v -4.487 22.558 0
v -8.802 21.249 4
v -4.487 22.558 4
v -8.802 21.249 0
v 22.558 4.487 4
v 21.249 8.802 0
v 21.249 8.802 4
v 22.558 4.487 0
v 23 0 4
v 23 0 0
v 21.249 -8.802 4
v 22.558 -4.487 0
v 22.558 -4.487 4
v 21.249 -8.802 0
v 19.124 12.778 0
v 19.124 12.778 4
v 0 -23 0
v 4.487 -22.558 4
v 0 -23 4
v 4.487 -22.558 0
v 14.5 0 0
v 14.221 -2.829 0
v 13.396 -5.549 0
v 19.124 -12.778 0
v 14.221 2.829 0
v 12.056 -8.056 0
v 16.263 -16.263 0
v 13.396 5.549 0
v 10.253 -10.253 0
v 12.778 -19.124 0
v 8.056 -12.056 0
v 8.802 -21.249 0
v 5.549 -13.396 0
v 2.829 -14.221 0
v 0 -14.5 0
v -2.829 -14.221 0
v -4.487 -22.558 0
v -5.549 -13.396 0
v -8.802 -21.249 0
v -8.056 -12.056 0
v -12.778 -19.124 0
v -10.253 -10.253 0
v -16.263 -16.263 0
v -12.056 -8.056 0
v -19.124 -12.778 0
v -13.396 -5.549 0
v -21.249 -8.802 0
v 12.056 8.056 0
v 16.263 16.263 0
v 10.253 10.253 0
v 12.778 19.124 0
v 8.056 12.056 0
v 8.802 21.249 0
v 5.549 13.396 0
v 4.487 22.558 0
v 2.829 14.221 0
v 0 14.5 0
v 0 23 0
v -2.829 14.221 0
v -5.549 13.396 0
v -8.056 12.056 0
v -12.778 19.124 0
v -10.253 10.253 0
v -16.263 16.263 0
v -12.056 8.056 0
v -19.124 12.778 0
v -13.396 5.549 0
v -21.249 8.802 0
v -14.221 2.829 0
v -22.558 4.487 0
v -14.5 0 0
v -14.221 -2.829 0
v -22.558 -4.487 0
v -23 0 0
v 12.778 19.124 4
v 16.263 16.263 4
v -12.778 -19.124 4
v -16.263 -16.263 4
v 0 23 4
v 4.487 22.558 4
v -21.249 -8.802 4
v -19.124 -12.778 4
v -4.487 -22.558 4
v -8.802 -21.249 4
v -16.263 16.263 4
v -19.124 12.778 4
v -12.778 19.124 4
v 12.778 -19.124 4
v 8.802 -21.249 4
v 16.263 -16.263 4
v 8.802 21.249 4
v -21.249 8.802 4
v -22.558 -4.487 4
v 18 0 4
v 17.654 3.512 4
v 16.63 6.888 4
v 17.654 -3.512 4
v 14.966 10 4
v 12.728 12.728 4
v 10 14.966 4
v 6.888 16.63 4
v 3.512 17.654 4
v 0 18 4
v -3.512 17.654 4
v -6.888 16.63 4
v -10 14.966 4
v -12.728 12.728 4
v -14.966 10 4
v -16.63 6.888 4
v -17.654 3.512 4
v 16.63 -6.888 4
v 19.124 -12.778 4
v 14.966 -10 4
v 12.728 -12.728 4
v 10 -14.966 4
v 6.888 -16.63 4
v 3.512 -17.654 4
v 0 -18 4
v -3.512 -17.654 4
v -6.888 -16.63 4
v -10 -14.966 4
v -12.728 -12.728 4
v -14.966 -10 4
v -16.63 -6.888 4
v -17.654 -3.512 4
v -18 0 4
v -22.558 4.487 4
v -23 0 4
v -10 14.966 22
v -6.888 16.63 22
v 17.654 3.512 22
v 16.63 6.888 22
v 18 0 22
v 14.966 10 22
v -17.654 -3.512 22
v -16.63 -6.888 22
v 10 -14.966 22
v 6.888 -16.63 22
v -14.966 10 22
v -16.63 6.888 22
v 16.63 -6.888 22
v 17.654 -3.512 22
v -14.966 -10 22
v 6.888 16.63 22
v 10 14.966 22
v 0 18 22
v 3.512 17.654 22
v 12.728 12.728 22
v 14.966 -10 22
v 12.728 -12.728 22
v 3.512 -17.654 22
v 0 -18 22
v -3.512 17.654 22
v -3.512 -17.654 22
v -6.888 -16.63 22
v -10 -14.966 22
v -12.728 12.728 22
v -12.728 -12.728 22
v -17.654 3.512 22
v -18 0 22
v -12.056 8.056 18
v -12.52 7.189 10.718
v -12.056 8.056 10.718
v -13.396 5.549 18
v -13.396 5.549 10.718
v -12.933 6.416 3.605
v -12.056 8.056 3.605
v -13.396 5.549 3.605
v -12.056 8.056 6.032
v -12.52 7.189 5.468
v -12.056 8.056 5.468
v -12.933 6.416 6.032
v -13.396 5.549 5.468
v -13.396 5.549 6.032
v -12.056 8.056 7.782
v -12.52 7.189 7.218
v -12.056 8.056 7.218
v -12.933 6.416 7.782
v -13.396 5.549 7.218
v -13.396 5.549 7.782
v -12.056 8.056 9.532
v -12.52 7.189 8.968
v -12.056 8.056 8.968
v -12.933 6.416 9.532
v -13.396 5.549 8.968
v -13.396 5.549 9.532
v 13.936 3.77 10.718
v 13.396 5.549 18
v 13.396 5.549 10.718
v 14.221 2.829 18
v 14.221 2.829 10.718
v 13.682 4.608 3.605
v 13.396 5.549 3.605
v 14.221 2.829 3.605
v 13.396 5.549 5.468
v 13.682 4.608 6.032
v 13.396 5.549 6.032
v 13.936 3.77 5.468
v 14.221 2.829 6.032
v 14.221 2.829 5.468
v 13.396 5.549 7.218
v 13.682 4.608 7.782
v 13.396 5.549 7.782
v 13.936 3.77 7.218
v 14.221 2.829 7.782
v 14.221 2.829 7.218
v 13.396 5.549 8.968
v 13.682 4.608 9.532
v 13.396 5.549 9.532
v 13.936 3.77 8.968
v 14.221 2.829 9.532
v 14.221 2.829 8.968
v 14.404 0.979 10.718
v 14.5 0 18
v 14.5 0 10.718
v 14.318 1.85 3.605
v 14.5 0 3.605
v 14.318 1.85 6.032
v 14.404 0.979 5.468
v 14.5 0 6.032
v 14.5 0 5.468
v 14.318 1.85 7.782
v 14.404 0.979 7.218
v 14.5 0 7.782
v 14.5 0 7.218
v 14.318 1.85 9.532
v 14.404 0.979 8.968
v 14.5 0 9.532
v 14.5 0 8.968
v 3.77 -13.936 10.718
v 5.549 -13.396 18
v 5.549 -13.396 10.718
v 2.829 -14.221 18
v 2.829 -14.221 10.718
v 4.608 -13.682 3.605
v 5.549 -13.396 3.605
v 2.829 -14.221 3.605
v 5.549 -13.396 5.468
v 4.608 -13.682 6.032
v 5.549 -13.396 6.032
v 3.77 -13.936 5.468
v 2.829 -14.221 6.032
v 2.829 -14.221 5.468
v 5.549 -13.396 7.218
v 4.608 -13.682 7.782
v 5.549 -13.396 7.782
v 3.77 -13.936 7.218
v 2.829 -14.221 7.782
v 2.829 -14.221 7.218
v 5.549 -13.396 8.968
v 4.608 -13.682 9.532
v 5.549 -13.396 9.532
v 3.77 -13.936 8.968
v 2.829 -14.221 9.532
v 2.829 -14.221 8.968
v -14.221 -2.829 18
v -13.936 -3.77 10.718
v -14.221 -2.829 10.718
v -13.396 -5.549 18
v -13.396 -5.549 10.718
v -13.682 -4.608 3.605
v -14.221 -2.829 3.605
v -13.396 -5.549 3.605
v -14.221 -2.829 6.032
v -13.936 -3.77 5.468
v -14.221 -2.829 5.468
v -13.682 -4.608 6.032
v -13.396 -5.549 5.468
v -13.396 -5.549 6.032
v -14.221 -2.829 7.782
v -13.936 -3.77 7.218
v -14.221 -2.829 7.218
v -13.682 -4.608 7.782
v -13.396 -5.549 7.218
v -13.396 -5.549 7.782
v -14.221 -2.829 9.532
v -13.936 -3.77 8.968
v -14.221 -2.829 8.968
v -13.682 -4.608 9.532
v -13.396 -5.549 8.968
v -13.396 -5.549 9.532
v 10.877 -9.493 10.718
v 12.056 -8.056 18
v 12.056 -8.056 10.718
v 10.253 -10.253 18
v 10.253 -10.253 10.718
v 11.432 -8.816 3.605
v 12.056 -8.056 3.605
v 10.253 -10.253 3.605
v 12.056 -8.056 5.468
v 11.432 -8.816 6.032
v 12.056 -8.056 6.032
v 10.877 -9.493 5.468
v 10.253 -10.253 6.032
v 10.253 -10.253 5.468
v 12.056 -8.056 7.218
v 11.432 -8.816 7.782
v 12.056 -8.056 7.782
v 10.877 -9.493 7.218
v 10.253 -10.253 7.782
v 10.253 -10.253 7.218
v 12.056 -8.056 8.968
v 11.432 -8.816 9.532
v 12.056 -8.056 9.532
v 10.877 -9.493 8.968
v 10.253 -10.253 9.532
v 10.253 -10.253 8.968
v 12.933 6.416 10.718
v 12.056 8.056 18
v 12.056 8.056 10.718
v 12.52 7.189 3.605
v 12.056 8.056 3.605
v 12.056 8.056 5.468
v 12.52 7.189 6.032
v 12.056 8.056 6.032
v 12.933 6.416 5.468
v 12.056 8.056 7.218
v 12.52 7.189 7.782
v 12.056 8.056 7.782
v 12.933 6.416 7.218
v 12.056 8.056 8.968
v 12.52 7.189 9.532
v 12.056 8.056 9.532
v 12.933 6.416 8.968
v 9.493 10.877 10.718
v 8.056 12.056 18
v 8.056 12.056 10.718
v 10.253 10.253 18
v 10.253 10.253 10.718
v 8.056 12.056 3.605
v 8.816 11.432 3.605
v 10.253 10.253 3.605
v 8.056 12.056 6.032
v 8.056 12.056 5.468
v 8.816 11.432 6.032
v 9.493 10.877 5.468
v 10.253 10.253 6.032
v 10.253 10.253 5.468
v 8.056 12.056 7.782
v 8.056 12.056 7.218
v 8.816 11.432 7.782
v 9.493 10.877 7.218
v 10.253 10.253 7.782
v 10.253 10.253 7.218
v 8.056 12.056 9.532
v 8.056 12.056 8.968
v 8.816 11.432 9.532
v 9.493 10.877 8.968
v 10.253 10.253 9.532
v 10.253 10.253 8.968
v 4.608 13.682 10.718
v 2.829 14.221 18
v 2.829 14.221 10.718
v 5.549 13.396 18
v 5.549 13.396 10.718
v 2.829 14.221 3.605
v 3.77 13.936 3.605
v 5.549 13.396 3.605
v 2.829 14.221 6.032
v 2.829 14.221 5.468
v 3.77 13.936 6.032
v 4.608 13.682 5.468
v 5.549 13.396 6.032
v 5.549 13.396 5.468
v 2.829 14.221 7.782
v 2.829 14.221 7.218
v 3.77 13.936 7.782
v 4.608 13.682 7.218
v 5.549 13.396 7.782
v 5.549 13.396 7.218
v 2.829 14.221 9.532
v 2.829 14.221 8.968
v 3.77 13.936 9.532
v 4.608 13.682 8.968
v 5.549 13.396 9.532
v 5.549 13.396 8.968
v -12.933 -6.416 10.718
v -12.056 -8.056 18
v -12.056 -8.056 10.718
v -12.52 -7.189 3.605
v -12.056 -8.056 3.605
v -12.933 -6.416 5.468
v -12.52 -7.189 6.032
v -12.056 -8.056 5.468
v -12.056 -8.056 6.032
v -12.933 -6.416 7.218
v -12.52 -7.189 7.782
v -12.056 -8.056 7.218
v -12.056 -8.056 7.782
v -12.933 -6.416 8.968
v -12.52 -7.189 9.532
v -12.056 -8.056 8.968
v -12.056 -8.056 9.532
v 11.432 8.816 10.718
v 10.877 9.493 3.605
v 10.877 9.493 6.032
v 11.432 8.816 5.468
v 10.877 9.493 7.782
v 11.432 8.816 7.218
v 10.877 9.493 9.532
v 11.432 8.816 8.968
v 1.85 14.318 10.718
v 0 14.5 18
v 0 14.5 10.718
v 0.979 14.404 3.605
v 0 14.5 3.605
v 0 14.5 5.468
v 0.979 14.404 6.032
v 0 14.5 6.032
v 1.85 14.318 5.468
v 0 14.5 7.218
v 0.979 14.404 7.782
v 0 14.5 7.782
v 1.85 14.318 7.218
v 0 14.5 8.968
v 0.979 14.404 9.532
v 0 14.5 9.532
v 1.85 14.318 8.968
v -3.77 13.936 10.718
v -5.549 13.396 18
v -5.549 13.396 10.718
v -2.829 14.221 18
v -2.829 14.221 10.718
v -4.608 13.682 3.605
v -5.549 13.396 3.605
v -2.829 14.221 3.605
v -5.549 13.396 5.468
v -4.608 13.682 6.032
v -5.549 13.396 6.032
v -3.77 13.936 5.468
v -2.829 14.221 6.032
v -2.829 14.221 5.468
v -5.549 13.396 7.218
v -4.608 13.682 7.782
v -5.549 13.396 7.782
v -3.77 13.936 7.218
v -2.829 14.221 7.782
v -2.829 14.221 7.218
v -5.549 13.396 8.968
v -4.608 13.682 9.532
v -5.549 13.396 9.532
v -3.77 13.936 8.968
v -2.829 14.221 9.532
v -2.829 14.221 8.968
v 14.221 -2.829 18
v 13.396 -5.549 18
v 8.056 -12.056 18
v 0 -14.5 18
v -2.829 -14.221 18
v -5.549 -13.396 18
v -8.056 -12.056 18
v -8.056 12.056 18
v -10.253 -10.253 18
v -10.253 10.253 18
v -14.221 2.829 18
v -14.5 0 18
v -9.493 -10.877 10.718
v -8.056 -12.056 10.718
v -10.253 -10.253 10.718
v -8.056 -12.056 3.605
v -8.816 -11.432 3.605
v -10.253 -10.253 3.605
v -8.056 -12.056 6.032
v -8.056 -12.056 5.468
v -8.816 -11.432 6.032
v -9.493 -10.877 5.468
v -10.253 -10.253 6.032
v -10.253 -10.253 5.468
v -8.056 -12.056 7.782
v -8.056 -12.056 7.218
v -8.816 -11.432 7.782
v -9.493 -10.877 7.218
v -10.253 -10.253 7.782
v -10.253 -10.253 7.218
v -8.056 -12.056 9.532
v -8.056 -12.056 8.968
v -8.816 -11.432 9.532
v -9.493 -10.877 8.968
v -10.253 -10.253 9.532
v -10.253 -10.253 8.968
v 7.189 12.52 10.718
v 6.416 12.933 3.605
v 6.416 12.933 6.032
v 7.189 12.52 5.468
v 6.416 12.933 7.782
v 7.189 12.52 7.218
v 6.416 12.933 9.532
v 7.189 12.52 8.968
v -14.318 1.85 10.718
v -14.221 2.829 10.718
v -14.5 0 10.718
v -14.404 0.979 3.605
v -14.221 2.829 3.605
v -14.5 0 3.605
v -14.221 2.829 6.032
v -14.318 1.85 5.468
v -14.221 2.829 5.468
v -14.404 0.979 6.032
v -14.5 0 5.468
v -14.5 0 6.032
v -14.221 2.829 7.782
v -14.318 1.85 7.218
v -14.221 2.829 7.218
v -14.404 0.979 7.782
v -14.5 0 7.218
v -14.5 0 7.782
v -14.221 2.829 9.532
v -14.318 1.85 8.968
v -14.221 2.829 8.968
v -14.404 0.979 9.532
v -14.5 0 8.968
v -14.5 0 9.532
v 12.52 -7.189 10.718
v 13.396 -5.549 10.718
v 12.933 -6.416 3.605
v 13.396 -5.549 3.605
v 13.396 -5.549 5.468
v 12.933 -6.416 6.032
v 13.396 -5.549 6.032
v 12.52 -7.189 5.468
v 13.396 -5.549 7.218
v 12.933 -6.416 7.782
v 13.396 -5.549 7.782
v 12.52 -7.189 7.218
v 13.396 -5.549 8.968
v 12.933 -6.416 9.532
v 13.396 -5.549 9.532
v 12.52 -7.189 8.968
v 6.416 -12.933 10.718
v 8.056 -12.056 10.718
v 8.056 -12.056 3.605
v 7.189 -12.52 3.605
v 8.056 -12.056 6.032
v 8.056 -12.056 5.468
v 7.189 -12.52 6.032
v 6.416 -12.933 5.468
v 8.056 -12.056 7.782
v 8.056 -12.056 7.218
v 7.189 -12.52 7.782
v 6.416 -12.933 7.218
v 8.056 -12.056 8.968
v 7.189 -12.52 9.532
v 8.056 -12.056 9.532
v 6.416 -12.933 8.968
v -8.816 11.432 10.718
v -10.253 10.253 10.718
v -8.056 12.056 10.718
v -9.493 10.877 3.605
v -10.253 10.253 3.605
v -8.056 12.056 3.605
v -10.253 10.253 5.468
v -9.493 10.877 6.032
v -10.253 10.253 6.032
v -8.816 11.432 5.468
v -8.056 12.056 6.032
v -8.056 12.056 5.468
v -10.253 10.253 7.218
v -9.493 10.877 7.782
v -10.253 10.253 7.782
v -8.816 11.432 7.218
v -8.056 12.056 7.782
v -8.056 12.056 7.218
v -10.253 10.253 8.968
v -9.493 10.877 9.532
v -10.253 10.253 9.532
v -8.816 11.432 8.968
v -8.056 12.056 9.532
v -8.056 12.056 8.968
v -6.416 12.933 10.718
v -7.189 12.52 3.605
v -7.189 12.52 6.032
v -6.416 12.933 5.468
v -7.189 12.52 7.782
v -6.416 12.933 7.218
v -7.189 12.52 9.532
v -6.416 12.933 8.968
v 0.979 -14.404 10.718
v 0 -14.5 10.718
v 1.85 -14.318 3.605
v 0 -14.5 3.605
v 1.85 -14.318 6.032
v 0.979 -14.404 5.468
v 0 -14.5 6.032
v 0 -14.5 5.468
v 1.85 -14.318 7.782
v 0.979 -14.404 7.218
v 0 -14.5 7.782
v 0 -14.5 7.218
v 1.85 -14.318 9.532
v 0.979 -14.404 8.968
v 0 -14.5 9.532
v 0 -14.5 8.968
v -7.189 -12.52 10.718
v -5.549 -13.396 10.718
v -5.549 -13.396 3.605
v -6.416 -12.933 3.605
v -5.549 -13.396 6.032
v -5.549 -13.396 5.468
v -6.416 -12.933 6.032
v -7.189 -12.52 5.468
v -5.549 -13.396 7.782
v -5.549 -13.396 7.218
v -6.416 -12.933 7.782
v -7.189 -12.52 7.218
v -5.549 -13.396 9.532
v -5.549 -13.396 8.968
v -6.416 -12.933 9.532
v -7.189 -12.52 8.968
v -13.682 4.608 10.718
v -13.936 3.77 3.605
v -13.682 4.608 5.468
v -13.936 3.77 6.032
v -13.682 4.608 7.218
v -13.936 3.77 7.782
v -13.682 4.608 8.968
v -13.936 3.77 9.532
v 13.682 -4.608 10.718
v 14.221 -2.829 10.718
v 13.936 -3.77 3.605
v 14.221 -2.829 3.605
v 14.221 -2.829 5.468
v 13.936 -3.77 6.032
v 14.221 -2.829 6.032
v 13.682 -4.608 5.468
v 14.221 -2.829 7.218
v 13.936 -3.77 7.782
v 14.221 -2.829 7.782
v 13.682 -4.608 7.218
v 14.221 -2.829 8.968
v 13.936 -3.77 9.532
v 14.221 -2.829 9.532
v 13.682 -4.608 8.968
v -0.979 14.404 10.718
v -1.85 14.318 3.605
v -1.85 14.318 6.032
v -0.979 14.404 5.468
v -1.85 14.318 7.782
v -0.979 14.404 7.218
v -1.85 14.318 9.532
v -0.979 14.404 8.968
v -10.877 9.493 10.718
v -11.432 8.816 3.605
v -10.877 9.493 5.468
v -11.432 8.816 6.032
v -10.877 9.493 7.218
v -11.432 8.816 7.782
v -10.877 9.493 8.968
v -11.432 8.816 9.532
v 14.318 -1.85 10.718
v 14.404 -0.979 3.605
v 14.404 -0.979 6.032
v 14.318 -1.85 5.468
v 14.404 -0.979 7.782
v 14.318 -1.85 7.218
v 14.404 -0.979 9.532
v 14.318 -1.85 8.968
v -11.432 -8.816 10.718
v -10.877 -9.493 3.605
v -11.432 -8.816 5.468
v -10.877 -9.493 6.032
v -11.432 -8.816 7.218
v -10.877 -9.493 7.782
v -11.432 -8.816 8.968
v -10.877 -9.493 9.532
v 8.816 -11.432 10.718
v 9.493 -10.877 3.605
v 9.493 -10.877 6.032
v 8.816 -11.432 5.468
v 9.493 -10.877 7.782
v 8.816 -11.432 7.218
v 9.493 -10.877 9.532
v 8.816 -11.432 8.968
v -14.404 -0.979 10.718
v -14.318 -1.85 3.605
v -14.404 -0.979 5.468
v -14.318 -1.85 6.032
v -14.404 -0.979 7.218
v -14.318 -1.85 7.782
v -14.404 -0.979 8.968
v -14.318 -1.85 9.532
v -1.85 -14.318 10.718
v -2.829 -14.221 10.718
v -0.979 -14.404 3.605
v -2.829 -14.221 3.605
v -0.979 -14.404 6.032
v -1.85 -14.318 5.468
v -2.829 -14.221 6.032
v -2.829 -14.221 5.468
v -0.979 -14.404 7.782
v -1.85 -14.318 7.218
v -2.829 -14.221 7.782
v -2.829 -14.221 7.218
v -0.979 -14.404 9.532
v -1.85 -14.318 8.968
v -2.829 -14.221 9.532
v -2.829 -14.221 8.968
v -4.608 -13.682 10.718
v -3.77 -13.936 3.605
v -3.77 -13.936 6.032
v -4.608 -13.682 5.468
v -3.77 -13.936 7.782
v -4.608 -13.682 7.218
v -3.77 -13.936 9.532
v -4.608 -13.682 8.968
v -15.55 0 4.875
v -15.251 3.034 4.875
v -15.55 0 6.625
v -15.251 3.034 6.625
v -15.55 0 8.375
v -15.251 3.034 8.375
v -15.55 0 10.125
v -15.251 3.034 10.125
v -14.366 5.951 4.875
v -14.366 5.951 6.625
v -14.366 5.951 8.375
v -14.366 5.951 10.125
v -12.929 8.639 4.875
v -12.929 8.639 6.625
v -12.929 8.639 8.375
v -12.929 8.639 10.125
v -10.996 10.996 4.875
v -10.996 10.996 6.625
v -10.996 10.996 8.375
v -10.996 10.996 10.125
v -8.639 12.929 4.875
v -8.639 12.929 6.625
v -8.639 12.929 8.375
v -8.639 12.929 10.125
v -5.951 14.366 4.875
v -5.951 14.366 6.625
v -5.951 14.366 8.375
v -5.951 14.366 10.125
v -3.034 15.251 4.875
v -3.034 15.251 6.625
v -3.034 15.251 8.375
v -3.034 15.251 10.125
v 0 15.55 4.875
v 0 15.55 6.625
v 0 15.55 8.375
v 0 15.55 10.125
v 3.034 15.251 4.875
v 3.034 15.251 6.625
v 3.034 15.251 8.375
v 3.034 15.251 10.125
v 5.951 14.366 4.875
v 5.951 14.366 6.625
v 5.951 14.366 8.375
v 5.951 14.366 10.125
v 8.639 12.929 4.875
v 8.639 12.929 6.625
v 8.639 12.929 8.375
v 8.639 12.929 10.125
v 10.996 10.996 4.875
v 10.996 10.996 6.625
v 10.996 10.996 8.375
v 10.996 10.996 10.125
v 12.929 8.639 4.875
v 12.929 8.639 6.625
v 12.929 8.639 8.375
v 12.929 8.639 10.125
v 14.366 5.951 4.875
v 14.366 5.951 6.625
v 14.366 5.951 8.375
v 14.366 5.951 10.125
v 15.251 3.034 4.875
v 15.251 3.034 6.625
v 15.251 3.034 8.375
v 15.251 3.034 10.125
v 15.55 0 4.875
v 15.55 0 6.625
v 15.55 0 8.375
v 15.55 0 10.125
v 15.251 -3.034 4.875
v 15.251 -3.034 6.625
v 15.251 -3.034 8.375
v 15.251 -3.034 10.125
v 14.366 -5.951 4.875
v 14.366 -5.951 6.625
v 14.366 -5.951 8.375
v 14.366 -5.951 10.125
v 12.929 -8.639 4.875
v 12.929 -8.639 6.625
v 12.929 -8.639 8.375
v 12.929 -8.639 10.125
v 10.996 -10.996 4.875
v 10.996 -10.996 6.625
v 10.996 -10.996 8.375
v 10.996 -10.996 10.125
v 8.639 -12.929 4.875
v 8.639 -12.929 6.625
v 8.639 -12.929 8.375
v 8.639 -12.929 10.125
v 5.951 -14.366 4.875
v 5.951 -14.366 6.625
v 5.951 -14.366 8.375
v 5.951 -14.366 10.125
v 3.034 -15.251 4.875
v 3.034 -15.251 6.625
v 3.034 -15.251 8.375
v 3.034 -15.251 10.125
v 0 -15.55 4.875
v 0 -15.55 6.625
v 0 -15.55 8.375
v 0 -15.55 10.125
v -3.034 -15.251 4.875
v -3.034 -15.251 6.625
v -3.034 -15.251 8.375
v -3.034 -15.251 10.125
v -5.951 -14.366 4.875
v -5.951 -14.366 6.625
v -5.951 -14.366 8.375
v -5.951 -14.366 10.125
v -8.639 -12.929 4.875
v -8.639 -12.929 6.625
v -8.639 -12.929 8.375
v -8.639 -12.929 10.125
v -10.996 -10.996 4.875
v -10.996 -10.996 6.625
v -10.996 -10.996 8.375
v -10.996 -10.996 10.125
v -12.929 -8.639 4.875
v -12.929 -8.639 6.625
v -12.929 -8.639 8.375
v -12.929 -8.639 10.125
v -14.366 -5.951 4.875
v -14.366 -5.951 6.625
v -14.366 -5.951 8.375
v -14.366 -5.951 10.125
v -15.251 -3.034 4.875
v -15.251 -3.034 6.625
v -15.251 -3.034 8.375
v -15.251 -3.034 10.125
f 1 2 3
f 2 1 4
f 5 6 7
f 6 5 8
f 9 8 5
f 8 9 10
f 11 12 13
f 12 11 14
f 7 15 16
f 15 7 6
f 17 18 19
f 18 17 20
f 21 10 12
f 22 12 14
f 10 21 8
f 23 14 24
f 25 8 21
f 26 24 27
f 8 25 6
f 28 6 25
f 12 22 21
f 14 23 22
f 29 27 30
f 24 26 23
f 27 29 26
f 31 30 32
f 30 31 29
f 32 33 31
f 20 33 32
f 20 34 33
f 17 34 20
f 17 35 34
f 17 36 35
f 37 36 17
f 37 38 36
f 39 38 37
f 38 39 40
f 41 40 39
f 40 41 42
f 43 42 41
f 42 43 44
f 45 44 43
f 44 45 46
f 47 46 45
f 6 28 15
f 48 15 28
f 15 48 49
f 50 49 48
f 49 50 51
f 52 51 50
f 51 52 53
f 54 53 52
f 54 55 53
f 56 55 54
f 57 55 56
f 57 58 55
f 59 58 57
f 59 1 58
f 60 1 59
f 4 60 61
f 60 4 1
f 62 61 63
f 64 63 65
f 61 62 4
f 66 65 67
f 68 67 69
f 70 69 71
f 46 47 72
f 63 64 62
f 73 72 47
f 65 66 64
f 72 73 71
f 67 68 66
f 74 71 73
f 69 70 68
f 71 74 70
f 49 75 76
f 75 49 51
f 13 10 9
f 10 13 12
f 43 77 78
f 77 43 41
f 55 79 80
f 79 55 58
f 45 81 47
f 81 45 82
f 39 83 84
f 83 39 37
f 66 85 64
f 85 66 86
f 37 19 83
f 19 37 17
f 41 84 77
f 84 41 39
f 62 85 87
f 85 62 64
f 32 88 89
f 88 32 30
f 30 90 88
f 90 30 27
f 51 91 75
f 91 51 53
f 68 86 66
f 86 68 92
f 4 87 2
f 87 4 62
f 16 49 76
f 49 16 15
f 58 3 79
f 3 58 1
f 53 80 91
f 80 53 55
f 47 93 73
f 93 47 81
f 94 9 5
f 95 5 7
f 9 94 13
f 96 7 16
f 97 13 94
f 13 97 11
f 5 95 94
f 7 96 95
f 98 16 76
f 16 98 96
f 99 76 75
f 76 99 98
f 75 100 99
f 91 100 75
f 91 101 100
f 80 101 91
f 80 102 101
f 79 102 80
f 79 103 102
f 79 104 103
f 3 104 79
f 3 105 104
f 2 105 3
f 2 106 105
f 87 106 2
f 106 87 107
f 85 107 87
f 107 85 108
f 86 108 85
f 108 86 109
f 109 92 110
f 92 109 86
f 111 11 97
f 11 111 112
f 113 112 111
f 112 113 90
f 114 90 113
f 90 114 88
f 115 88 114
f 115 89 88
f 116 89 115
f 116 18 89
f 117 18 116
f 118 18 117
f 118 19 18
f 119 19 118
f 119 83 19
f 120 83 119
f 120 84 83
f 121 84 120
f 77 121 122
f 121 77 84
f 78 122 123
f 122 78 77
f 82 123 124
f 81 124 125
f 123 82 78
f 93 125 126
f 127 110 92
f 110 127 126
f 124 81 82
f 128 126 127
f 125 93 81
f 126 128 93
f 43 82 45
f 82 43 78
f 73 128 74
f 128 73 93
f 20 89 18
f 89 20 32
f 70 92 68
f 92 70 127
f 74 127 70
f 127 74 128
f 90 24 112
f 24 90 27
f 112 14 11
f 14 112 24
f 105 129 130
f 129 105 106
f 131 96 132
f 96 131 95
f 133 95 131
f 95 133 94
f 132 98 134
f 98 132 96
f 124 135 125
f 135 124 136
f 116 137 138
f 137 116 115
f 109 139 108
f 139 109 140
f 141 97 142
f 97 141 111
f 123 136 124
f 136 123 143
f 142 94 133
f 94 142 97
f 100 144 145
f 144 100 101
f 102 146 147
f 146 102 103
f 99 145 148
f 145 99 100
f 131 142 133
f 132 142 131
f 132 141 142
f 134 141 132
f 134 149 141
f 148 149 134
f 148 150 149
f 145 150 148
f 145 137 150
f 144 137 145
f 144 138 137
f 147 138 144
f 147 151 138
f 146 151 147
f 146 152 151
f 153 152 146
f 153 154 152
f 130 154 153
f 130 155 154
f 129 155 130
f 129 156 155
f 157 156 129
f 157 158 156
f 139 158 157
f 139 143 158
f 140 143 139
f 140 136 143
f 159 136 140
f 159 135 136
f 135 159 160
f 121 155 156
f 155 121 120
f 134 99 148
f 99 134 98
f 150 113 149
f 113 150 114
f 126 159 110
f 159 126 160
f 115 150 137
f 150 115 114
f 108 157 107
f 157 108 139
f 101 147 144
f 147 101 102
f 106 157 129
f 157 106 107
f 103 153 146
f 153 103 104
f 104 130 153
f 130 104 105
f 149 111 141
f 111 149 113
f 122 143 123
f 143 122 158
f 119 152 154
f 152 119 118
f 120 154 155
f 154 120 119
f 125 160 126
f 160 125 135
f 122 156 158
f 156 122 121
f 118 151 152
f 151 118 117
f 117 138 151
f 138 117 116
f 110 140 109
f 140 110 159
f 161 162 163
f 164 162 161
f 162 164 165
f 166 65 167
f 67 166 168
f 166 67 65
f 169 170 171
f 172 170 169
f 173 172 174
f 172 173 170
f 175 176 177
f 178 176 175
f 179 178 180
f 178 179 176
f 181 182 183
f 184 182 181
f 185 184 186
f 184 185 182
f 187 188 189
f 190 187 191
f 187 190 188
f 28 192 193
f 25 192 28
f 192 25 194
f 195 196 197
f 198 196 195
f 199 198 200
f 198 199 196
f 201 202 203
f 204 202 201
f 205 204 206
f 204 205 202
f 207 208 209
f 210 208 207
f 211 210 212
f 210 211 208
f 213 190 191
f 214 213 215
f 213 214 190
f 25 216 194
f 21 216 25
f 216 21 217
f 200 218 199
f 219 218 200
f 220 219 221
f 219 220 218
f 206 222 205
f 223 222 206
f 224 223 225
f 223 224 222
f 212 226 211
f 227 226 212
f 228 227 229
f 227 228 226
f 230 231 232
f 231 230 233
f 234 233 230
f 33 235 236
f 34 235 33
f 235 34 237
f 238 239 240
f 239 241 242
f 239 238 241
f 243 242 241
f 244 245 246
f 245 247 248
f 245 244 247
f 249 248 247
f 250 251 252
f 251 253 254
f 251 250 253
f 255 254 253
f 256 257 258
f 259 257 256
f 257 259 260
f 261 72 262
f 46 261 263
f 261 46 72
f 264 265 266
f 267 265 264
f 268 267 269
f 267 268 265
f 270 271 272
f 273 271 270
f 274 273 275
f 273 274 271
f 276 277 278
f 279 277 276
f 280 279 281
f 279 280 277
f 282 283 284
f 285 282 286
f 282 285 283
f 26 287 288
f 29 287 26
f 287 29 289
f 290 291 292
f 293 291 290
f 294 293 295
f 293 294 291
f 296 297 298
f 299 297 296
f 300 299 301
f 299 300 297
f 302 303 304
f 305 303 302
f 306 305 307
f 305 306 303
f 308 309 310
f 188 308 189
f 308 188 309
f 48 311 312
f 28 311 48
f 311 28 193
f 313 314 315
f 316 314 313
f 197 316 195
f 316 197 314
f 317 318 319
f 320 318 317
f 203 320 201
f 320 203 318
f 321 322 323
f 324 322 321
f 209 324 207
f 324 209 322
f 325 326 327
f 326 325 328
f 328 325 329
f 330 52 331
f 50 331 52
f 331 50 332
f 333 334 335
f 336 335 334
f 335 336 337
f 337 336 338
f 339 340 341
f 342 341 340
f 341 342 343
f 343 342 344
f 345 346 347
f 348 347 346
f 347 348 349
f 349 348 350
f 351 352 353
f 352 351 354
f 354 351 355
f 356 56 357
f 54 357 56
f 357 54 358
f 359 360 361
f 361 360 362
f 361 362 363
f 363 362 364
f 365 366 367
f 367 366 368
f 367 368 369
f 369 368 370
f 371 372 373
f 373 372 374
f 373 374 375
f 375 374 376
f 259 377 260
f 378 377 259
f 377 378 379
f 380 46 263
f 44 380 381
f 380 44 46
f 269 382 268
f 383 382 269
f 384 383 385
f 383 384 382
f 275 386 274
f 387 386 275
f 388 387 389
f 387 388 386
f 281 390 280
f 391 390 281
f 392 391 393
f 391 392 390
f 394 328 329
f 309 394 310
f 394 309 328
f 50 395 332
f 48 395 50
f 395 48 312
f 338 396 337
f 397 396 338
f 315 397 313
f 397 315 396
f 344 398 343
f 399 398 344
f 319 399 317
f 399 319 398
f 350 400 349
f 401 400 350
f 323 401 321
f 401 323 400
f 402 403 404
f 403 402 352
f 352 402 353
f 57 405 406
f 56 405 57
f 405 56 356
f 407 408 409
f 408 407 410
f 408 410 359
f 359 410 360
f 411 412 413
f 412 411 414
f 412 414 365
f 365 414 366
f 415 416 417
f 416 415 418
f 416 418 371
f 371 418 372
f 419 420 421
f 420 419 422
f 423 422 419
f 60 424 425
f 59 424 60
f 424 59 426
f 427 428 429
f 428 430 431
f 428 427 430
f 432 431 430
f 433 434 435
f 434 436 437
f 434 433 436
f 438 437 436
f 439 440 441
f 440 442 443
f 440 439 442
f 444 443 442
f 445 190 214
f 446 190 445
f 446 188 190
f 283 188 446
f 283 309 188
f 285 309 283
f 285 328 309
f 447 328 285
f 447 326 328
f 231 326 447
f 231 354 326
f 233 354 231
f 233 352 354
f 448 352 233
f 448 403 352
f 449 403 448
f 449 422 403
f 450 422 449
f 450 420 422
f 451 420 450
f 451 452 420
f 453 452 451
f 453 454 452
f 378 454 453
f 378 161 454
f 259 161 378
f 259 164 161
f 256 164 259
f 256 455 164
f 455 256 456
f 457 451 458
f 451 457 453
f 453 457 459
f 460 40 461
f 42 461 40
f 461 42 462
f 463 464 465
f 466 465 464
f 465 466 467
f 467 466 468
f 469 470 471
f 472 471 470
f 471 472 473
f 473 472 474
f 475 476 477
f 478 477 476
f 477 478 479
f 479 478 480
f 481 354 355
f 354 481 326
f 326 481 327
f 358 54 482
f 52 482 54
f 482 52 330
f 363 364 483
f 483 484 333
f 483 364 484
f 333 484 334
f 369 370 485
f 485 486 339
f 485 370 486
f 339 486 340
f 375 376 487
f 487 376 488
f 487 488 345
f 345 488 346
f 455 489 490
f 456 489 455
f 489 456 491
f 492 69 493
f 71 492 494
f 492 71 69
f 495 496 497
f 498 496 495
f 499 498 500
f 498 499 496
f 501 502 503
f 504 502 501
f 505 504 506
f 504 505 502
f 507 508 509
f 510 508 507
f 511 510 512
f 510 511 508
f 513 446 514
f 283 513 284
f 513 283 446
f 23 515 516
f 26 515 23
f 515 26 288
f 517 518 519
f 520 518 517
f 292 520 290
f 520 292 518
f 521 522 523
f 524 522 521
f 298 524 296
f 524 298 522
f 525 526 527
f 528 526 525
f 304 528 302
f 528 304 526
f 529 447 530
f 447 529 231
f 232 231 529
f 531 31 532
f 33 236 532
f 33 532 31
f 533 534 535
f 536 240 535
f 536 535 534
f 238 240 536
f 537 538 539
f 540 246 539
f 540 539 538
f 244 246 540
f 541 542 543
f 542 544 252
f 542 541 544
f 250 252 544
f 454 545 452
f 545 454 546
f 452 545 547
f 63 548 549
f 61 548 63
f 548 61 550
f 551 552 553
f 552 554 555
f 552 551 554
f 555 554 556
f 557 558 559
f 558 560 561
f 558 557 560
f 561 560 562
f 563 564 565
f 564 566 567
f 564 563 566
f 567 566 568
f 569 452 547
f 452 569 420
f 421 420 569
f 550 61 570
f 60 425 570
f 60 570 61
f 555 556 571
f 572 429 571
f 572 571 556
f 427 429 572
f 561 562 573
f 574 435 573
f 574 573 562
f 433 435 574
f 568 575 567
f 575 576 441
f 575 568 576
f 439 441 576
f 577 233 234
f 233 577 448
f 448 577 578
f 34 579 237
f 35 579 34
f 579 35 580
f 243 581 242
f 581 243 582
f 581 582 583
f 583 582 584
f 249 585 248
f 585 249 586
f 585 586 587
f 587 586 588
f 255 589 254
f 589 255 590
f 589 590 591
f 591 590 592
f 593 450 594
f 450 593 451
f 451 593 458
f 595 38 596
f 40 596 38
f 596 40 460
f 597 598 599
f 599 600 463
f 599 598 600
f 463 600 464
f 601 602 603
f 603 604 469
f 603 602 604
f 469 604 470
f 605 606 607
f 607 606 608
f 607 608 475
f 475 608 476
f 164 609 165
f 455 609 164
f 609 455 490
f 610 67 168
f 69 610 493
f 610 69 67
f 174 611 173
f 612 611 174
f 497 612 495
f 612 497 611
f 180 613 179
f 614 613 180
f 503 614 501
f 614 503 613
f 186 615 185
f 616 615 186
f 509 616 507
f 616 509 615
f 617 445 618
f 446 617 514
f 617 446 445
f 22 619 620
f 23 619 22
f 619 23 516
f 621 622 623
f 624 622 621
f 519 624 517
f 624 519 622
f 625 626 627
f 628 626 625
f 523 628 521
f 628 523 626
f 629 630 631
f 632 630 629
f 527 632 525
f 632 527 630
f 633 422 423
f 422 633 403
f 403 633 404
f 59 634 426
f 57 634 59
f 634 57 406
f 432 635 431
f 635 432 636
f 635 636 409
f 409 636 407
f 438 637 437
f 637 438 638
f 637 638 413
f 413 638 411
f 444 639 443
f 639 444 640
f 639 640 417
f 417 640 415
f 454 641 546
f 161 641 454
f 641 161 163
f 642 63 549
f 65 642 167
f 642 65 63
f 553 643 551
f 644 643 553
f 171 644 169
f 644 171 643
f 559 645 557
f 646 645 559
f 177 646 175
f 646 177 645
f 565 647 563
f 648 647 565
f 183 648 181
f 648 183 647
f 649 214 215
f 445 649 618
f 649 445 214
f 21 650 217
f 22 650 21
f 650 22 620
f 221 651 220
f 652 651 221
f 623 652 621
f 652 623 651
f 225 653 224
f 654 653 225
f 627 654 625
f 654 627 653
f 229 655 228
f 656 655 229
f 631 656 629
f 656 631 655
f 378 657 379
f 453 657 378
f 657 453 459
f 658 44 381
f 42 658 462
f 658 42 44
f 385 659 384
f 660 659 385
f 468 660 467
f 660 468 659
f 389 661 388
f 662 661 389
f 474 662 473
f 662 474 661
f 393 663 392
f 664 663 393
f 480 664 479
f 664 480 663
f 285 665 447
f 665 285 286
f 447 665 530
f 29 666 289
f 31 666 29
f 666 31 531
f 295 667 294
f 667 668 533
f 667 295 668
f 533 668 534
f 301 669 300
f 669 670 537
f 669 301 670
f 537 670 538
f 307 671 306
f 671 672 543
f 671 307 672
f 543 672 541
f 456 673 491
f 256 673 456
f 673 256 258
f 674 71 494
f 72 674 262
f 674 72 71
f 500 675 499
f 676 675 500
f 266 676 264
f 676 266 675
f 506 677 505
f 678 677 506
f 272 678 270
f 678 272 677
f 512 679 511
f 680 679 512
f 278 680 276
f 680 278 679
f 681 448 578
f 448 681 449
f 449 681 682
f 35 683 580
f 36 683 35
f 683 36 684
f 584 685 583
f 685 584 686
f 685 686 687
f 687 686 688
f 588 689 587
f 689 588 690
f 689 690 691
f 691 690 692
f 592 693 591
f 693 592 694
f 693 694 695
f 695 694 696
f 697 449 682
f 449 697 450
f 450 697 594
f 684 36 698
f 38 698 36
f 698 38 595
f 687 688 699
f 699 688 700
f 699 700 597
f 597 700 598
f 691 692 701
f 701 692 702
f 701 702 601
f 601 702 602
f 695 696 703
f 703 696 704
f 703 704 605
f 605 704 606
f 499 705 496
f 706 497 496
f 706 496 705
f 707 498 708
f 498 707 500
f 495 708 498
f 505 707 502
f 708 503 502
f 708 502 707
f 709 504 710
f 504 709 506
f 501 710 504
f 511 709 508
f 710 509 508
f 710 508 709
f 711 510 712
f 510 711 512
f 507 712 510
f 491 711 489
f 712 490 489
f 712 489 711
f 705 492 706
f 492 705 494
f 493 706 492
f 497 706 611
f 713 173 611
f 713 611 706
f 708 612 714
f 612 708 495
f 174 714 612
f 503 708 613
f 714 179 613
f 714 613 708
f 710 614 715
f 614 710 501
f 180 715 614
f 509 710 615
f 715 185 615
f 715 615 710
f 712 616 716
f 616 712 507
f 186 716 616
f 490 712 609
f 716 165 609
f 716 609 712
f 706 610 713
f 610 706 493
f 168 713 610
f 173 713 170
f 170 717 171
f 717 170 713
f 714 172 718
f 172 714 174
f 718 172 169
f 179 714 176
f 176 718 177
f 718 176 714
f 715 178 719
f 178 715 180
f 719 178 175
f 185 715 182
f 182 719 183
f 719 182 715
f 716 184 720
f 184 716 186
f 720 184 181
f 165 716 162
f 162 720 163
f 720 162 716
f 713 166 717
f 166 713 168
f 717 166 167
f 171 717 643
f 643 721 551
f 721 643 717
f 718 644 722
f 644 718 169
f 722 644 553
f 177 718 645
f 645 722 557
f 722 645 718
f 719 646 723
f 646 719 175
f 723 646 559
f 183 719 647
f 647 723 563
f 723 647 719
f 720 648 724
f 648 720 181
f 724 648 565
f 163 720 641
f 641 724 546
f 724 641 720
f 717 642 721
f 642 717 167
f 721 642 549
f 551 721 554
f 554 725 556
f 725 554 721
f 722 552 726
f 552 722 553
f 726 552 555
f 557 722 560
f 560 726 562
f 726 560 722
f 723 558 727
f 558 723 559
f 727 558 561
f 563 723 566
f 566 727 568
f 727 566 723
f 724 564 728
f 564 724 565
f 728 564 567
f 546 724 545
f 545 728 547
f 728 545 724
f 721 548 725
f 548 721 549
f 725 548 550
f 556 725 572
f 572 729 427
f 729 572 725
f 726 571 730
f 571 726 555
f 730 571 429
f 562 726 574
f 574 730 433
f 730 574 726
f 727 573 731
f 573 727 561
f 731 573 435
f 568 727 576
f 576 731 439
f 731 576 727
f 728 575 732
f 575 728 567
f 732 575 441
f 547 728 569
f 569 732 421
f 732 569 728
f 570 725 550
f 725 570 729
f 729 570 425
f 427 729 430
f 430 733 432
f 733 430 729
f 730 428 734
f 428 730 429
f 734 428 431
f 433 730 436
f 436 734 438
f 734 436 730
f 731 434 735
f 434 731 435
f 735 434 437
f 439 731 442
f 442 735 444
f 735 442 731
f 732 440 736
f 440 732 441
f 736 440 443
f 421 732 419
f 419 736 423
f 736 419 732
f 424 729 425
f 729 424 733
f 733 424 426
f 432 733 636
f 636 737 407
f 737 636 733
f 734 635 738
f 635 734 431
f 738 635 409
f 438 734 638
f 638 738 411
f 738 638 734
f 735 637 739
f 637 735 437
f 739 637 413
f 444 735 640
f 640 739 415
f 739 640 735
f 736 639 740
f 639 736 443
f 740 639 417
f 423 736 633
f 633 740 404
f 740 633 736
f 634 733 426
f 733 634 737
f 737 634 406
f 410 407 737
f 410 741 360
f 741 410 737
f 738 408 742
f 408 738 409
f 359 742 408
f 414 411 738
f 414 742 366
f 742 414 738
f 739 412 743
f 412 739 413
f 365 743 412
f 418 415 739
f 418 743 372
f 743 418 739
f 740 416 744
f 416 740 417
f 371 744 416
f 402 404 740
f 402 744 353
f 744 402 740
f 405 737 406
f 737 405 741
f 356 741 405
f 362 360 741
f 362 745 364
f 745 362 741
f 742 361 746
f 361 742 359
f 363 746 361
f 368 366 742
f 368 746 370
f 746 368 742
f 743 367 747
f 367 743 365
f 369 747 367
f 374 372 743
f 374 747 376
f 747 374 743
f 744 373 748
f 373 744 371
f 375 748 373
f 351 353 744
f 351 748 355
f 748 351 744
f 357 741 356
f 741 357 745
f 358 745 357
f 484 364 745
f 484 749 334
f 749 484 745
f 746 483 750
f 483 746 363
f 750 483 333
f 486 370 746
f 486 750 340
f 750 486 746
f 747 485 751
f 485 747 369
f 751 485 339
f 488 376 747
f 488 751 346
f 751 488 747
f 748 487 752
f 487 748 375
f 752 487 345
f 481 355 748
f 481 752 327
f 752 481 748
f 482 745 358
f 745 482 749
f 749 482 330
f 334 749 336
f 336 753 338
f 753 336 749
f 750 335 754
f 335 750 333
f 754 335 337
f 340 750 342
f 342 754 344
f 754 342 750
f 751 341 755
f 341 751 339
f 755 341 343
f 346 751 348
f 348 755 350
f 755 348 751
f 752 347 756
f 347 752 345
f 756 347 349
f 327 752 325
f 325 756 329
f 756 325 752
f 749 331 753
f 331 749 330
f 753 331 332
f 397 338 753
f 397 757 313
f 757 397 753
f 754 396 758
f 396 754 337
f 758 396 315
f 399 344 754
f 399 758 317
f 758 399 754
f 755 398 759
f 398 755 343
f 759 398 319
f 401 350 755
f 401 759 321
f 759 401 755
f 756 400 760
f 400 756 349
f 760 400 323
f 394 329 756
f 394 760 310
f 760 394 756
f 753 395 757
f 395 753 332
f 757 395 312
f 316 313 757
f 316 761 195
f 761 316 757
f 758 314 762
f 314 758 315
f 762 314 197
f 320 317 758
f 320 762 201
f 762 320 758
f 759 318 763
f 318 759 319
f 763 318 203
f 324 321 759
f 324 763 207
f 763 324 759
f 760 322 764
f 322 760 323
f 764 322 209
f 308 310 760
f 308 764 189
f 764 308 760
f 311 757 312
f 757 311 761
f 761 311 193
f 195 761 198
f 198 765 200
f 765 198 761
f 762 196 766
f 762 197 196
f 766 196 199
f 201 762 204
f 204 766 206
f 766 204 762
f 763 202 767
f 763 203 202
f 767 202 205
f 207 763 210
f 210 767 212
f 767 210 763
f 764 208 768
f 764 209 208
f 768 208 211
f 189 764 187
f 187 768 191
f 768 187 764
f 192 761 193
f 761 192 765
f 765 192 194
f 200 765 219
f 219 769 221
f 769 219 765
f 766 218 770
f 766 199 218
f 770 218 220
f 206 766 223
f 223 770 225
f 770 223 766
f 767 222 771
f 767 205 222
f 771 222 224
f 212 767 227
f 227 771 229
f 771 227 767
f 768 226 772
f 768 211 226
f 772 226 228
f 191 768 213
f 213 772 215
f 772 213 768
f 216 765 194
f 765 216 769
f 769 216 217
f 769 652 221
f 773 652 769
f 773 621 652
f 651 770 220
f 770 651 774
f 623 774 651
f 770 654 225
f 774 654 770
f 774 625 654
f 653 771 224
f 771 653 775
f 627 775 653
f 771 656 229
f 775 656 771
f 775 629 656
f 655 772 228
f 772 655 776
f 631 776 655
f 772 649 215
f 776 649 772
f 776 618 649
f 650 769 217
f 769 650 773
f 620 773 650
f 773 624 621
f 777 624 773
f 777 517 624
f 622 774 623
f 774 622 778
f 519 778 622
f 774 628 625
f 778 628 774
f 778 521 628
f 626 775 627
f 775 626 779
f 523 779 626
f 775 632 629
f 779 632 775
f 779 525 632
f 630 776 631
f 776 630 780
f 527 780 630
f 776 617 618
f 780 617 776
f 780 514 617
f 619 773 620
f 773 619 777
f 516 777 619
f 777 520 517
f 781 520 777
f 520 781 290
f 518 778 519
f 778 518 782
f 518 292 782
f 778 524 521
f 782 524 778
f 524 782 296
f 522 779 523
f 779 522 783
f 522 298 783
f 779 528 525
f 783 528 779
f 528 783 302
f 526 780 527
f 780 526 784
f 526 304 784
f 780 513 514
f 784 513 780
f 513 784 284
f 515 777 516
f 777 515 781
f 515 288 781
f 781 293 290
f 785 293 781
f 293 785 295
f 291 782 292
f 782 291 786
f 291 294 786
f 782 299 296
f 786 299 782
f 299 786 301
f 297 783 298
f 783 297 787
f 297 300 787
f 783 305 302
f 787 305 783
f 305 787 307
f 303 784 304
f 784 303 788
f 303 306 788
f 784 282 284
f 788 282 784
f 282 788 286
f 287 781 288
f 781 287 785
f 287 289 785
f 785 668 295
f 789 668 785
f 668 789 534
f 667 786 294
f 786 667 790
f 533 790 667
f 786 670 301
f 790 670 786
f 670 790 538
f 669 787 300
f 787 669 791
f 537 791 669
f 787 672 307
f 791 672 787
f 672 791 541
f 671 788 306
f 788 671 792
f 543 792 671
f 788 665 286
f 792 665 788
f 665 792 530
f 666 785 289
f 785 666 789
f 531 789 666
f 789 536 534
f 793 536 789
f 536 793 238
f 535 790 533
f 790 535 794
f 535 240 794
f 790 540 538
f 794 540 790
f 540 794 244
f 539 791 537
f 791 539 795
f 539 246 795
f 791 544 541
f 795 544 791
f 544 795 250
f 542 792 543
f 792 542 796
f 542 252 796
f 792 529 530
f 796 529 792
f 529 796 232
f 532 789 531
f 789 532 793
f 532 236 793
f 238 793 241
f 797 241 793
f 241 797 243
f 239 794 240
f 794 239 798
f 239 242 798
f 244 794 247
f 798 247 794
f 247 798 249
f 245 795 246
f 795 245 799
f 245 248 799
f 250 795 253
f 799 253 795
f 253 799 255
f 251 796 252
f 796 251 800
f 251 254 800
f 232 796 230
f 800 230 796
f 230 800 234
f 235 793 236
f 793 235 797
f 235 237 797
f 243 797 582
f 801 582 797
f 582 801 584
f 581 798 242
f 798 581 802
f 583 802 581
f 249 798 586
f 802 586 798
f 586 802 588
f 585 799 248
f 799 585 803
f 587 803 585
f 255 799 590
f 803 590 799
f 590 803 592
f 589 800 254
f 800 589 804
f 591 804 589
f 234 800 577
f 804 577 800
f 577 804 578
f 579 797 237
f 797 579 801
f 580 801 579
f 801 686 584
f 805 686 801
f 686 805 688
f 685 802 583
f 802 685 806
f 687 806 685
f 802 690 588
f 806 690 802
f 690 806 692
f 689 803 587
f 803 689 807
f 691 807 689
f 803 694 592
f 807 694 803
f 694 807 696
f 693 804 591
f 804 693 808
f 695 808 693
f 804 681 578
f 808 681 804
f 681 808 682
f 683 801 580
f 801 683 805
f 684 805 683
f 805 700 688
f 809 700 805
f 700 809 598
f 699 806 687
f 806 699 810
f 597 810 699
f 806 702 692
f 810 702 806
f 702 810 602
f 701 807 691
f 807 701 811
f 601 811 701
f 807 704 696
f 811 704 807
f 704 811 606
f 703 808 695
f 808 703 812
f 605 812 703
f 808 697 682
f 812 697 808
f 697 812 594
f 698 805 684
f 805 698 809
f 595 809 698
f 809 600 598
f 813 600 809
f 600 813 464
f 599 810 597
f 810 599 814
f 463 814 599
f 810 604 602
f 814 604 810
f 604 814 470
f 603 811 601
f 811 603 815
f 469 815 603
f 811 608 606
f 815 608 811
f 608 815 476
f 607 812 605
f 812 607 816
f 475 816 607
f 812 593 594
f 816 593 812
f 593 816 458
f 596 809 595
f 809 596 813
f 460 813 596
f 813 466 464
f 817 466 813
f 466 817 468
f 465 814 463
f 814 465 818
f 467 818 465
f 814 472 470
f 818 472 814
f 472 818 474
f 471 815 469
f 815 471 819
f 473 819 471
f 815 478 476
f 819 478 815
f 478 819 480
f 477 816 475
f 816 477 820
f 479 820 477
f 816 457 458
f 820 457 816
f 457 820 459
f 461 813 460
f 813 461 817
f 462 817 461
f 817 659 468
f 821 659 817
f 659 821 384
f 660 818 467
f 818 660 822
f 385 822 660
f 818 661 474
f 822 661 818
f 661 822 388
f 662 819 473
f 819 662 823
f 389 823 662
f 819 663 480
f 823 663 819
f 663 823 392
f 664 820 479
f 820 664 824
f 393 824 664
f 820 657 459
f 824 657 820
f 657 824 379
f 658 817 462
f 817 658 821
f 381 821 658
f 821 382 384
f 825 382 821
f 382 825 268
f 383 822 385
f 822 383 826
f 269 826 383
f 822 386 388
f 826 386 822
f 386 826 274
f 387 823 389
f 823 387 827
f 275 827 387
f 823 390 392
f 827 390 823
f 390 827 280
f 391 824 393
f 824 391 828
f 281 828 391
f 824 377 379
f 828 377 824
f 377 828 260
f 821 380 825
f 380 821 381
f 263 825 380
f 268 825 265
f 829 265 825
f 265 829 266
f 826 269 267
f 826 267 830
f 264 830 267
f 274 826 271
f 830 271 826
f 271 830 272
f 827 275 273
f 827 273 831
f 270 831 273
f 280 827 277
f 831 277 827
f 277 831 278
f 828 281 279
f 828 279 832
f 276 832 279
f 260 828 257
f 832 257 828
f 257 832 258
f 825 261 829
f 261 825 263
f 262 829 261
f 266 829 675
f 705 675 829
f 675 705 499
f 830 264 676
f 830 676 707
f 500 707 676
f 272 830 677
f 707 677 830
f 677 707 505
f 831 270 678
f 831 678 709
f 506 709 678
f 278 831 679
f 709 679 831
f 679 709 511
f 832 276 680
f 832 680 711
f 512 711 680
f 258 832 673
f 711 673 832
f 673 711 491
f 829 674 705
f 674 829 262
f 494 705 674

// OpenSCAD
$fn = 32;

// ----------------------------------------------------------------------
// Threaded cap: 36 mm body, 18 mm tall, 29 mm threaded bore
// ----------------------------------------------------------------------

// --- parameters (mm) ---
outer_d = 36;             // cap outside diameter
body_h = 18;              // cap height
top_t = 4;                // closed top thickness
bore_d = 29;              // bore core diameter
pitch = 1.75;             // thread pitch
thread_d = 1.05;          // thread depth
thread_z = 3;             // thread start above the rim
thread_h = 8;             // threaded height
flange_d = 46;            // flange diameter
flange_t = 4;             // flange thickness

difference() {
  union() {
    cylinder(h = 4, d = flange_d);
    translate([0, 0, 3.5]) cylinder(h = 18.5, d = outer_d);
  }
  /* threaded bore, closed at the top */
  translate([0, 0, -2.5]) cylinder(h = 20.5, d = bore_d);
  translate([0, 0, 3]) rotate_extrude() polygon([[13.5, 0], [13.5, 8], [14, 8], [15.55, 7.125], [14, 6.25], [15.55, 5.375], [14, 4.5], [15.55, 3.625], [14, 2.75], [15.55, 1.875], [14, 0], [13.5, 0]]);
}
